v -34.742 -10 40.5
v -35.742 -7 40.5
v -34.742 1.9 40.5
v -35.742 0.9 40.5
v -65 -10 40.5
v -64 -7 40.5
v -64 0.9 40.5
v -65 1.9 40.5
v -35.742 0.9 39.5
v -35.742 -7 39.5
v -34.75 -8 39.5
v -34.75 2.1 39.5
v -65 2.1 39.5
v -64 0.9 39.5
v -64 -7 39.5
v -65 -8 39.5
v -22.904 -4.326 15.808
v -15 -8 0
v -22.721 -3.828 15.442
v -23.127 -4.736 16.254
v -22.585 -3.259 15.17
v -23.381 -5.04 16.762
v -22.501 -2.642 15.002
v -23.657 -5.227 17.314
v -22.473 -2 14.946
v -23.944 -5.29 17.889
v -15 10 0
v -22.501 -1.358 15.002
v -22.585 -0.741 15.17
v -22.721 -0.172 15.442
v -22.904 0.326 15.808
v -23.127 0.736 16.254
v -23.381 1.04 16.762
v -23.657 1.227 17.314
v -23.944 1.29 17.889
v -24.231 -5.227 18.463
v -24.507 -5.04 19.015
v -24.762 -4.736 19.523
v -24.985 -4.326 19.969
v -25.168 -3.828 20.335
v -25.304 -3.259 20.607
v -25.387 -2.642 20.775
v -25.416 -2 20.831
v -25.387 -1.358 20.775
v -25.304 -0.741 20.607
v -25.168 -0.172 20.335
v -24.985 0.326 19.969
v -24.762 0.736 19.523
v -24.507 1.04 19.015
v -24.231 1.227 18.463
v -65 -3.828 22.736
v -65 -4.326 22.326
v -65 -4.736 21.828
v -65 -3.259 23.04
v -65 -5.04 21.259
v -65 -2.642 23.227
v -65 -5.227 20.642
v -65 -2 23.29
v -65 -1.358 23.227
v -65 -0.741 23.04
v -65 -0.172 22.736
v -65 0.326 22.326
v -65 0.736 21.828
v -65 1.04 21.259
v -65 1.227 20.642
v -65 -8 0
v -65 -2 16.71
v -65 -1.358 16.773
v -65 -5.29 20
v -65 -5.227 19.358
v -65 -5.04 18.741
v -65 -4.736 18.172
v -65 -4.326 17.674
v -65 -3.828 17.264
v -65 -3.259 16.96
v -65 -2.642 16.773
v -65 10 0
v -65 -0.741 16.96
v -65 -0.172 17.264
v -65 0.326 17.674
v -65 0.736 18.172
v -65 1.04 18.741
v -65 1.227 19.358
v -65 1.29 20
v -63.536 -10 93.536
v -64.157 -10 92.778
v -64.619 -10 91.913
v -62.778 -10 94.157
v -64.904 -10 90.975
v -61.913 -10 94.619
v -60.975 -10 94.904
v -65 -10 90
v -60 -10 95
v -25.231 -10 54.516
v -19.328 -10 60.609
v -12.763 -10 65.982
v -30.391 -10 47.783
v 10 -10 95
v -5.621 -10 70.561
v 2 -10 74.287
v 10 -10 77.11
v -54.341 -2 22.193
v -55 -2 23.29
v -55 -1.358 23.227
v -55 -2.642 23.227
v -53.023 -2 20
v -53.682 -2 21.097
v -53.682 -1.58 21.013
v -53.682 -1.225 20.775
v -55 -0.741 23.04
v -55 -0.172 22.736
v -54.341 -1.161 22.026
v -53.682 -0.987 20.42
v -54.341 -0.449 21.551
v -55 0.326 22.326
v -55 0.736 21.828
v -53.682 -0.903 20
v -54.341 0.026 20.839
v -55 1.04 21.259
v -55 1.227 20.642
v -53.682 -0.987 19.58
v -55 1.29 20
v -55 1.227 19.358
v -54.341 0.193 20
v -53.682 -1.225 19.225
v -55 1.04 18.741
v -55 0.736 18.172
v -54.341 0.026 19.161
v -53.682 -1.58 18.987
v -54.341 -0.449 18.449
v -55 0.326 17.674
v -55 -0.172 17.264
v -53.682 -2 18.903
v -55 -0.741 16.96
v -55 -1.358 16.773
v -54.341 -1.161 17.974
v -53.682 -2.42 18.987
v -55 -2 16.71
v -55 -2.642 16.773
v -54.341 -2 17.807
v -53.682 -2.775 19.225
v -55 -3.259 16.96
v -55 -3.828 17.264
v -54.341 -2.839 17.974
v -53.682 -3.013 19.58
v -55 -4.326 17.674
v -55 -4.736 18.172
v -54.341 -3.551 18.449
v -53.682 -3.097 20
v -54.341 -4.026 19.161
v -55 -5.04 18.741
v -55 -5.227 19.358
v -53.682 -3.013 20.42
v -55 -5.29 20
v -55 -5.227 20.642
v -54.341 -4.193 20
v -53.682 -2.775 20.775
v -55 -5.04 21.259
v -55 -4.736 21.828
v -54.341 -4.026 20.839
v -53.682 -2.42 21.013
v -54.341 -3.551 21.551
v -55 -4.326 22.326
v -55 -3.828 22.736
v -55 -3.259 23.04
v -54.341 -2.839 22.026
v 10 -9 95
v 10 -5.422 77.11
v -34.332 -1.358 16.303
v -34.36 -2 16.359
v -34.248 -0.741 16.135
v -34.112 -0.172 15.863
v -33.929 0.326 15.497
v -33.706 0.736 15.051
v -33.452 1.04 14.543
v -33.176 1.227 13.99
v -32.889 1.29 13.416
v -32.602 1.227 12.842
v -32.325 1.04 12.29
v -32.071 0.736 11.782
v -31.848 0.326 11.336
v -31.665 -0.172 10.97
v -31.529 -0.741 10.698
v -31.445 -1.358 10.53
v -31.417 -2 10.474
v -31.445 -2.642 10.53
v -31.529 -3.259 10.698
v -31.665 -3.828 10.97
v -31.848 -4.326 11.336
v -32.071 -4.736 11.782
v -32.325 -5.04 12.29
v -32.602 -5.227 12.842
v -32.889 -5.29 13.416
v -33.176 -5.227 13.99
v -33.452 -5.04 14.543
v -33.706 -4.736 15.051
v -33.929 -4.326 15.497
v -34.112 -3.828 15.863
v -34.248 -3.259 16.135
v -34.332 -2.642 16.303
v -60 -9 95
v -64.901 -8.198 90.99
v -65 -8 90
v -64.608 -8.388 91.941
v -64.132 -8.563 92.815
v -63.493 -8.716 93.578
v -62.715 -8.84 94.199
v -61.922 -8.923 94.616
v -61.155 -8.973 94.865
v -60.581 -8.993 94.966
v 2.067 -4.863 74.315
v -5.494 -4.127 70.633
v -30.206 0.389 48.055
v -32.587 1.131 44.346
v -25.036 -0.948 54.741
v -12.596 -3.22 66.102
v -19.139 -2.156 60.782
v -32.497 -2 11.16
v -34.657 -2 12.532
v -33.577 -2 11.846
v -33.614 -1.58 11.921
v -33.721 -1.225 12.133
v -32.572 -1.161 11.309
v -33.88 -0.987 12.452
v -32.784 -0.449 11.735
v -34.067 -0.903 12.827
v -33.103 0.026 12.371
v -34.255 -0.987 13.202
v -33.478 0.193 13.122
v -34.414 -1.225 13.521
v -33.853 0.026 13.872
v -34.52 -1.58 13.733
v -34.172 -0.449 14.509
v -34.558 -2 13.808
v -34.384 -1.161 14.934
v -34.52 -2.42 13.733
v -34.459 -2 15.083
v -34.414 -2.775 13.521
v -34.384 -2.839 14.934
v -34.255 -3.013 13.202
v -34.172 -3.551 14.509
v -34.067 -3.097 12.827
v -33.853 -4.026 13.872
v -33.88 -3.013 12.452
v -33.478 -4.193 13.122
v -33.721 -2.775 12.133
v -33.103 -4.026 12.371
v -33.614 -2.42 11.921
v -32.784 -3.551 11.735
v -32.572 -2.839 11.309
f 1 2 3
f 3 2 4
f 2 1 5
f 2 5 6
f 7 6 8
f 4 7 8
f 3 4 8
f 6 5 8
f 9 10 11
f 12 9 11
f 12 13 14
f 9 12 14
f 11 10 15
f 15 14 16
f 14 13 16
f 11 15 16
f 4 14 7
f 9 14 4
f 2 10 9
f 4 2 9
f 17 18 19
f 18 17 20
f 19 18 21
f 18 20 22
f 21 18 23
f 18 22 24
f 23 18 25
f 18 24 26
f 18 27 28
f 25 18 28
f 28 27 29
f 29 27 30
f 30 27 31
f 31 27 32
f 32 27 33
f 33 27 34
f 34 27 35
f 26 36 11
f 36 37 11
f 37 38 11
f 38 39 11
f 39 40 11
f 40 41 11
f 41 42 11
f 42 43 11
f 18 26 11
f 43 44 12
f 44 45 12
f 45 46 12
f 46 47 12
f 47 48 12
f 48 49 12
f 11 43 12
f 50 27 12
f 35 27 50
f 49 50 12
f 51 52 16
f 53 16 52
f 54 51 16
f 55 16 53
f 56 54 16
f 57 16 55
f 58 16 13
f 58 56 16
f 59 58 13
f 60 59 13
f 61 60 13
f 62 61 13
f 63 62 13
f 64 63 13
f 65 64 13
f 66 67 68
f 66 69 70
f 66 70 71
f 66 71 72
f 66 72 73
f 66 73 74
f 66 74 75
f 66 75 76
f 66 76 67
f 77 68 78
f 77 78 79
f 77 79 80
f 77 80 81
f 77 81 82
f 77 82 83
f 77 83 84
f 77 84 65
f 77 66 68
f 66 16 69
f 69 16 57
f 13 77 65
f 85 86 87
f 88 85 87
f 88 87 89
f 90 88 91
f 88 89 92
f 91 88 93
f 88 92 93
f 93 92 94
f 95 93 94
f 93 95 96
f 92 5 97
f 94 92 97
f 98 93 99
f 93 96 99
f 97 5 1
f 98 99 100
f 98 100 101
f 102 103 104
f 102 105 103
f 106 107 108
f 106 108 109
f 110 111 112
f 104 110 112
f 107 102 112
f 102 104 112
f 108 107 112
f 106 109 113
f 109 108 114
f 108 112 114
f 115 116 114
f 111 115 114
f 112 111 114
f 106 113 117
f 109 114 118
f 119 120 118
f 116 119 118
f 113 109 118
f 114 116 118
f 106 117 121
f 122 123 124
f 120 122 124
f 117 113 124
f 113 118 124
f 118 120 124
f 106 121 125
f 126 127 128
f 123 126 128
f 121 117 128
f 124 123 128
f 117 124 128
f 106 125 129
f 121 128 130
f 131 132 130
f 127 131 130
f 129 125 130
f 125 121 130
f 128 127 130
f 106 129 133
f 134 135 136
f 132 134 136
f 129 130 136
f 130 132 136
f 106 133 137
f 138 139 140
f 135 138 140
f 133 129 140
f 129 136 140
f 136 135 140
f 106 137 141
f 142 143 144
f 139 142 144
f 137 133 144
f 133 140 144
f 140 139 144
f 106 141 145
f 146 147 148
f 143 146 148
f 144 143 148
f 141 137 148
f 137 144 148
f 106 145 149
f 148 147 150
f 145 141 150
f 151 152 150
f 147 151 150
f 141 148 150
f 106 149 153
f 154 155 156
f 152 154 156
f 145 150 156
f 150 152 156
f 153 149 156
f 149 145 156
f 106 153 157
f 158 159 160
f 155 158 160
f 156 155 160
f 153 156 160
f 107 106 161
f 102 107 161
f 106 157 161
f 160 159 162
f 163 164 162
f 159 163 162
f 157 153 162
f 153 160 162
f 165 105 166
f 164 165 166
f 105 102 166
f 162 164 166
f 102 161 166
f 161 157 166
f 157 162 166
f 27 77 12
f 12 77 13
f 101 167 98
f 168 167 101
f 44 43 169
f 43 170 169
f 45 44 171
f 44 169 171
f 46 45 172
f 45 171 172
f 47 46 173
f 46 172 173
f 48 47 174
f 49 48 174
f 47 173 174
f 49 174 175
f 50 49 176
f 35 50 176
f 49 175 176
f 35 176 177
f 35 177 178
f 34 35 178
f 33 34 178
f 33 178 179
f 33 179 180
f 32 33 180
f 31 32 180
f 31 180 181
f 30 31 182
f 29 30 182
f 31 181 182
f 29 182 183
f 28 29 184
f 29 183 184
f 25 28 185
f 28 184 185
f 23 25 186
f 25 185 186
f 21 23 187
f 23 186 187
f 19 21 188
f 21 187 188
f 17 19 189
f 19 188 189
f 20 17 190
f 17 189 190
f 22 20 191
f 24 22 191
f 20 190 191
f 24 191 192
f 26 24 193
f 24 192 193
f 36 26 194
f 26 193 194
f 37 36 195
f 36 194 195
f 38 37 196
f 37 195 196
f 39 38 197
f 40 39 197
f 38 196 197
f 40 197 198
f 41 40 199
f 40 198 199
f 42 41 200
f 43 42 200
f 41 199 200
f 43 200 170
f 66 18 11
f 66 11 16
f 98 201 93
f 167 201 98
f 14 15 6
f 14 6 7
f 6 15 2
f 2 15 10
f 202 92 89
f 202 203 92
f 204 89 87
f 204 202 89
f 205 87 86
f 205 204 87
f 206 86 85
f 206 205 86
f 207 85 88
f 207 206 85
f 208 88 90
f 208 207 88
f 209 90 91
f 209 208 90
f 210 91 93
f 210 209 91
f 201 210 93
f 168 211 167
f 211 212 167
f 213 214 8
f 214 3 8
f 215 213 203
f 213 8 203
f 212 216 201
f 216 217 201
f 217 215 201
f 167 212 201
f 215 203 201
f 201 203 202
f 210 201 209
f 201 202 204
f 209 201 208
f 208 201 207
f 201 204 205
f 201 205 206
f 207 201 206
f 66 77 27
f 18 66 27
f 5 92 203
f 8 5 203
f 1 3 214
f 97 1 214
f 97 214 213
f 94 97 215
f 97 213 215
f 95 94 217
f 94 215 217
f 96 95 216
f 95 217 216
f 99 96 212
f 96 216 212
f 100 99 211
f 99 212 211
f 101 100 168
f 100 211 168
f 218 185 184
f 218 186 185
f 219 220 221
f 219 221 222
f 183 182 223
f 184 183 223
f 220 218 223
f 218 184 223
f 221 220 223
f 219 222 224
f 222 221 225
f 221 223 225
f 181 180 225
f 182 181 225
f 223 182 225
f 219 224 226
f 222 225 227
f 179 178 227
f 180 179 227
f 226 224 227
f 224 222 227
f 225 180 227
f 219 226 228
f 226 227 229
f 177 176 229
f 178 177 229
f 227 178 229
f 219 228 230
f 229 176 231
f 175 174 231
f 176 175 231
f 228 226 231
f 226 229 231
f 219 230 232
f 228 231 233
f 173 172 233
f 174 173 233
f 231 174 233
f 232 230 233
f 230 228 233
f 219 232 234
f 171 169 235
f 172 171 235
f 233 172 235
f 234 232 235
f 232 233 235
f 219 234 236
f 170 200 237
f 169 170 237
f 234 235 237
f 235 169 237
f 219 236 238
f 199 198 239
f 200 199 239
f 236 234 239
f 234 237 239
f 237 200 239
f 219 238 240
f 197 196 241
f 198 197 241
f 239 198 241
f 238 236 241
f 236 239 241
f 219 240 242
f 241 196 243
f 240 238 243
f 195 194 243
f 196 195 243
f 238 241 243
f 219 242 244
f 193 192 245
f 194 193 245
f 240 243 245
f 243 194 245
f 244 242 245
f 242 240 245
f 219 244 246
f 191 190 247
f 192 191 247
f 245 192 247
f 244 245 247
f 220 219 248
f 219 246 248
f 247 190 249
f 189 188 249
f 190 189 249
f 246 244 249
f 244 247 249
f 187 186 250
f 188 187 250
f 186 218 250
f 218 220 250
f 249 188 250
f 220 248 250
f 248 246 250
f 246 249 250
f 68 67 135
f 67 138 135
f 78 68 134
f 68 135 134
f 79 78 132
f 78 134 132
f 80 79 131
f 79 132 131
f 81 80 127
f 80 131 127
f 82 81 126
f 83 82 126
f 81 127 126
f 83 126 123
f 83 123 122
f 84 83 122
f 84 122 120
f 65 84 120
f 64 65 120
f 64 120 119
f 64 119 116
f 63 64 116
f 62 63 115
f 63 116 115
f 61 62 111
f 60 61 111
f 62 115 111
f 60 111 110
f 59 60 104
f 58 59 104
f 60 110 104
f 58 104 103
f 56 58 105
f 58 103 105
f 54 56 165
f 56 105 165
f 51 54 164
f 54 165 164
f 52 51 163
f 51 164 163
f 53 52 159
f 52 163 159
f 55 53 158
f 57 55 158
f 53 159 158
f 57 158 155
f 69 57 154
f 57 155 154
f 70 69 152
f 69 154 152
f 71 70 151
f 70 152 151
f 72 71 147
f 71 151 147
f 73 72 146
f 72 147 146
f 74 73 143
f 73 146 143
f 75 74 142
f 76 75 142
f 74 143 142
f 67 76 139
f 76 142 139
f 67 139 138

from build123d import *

# Parameters (mm, degrees)
ESBO_O1_W                                      = 130
ESBO_O1_H                                      = 20
RESSALTO_EXTRUS_O1_DEPTH                       = 95
CORTE_EXTRUS_O2_REACH                          = 22
CORTE_EXTRUS_O4_DEPTH                          = 1
CORTE_EXTRUS_O4_DEPTH_BACK                     = 131
BROCA_DE_ROSQUEAR_DE_CANO_PARA_TARRAXA_D_D     = 6.579997
BROCA_DE_ROSQUEAR_DE_CANO_PARA_TARRAXA_D_DEPTH = 10
BROCA_DE_ROSQUEAR_DE_CANO_PARA_TARRAXA_D_TIP   = 1.976830535
BROCA_DE_ROSQUEAR_DE_CANO_PARA_TARRA_2_D       = 6.579997
BROCA_DE_ROSQUEAR_DE_CANO_PARA_TARRA_2_DEPTH   = 10
BROCA_DE_ROSQUEAR_DE_CANO_PARA_TARRA_2_TIP     = 1.976830535
FILETE2_R                                      = 5
CORTE_EXTRUS_O7_DEPTH                          = 131
RESSALTO_EXTRUS_O2_REACH                       = 57.5
ESBO_O37_W                                     = 28.258303284
ESBO_O37_H                                     = 7.9
CORTE_EXTRUS_O8_REACH                          = 21.612
ESBO_O38_W                                     = 55
ESBO_O38_H                                     = 21.847631836
ESBO_O39_W                                     = 50
ESBO_O39_H                                     = 2
CORTE_EXTRUS_O9_DEPTH                          = 40.5


with BuildPart() as part:
    # Esboço1 → Ressalto-extrusão1 (new body)
    with BuildSketch(Plane.XY):
        Rectangle(ESBO_O1_W, ESBO_O1_H)
    extrude(amount=RESSALTO_EXTRUS_O1_DEPTH)

    # Esboço2 → Corte-extrusão2 (cut, up to next)
    with BuildSketch(Plane(origin=(0, 10, 0), x_dir=(1, 0, 0), z_dir=(0, 1, 0)), mode=Mode.PRIVATE) as corte_extrus_o2_sk1:
        with BuildLine():
            Line((65, 0), (-15, 0))
            Line((-15, 0), (-35, -40))
            ThreePointArc((-35, -40), (-7.92883262, -69.207295879), (30.404335441, -80))
            Line((30.404335441, -80), (65, -80))
            Line((65, -80), (65, 0))
        make_face()
    corte_extrus_o2_tool1 = extrude(corte_extrus_o2_sk1.sketch, amount=-CORTE_EXTRUS_O2_REACH, mode=Mode.PRIVATE) & part.part
    add(corte_extrus_o2_tool1.solids().sort_by_distance((21.312978, 10, 38.404428))[0], mode=Mode.SUBTRACT)

    # Esboço13 → Corte-extrusão4 (cut, two sides)
    with BuildSketch(Plane.ZY.offset(65)) as corte_extrus_o4_sk:
        Polygon((-200.200134404, 50.040026881), (0, 10), (95, -9), (295.200134404, -49.040026881), (375.280188165, 351.360241926), (-120.120080642, 450.440295688), align=None)
    extrude(amount=CORTE_EXTRUS_O4_DEPTH, mode=Mode.SUBTRACT)
    extrude(corte_extrus_o4_sk.sketch, amount=-CORTE_EXTRUS_O4_DEPTH_BACK, mode=Mode.SUBTRACT)

    # Broca de rosquear de cano para tarraxa d
    with Locations(Plane.ZY.offset(65)):
        with Locations((20, -2)):
            Hole(BROCA_DE_ROSQUEAR_DE_CANO_PARA_TARRAXA_D_D / 2, depth=BROCA_DE_ROSQUEAR_DE_CANO_PARA_TARRAXA_D_DEPTH)
            with Locations((0, 0, -(BROCA_DE_ROSQUEAR_DE_CANO_PARA_TARRAXA_D_DEPTH + BROCA_DE_ROSQUEAR_DE_CANO_PARA_TARRAXA_D_TIP / 2))):  # 118° drill point
                Cone(0, BROCA_DE_ROSQUEAR_DE_CANO_PARA_TARRAXA_D_D / 2, BROCA_DE_ROSQUEAR_DE_CANO_PARA_TARRAXA_D_TIP, mode=Mode.SUBTRACT)

    # Broca de rosquear de cano para tarra 2
    with Locations(Plane(origin=(-12, 0, -6), x_dir=(0.447213595, 0, -0.894427191), z_dir=(0.894427191, 0, 0.447213595))):
        with Locations((-26.708203932, -2)):
            Hole(BROCA_DE_ROSQUEAR_DE_CANO_PARA_TARRA_2_D / 2, depth=BROCA_DE_ROSQUEAR_DE_CANO_PARA_TARRA_2_DEPTH)
            with Locations((0, 0, -(BROCA_DE_ROSQUEAR_DE_CANO_PARA_TARRA_2_DEPTH + BROCA_DE_ROSQUEAR_DE_CANO_PARA_TARRA_2_TIP / 2))):  # 118° drill point
                Cone(0, BROCA_DE_ROSQUEAR_DE_CANO_PARA_TARRA_2_D / 2, BROCA_DE_ROSQUEAR_DE_CANO_PARA_TARRA_2_TIP, mode=Mode.SUBTRACT)

    # Filete2
    filete2_edges = [part.edges().sort_by_distance(p)[0] for p in [
        (-65, -9.5, 95),
    ]]
    fillet(filete2_edges, radius=FILETE2_R)

    # Esboço34 → Corte-extrusão7 (cut, through all)
    with BuildSketch(Plane.ZY.offset(65)):
        Polygon((40, -10), (40, 2), (39.5, 2.1), (39.5, -10), align=None)
        Polygon((40.5, 1.9), (40, 2), (40, -10), (40.5, -10), align=None)
    extrude(amount=-CORTE_EXTRUS_O7_DEPTH, mode=Mode.SUBTRACT)

    # Esboço37 → Ressalto-extrusão2 (add, up to next)
    with BuildSketch(Plane.XY.offset(39.5), mode=Mode.PRIVATE) as ressalto_extrus_o2_sk1:
        with Locations((-49.870848358, -3.05)):
            Rectangle(ESBO_O37_W, ESBO_O37_H)
    ressalto_extrus_o2_tool1 = extrude(ressalto_extrus_o2_sk1.sketch, amount=RESSALTO_EXTRUS_O2_REACH, mode=Mode.PRIVATE) - part.part
    add(ressalto_extrus_o2_tool1.solids().sort_by_distance((-49.870848, -3.05, 39.5))[0])

    # Esboço38 → Corte-extrusão8 (cut, up to next)
    with BuildSketch(Plane(origin=(0, 9.615384615, 1.923076923), x_dir=(1, 0, 0), z_dir=(0, 0.980580676, 0.196116135)), mode=Mode.PRIVATE) as corte_extrus_o8_sk1:
        with Locations((37.5, -84.932685446)):
            Rectangle(ESBO_O38_W, ESBO_O38_H)
    corte_extrus_o8_tool1 = extrude(corte_extrus_o8_sk1.sketch, amount=-CORTE_EXTRUS_O8_REACH, mode=Mode.PRIVATE) & part.part
    add(corte_extrus_o8_tool1.solids().sort_by_distance((37.5, -7.041285, 85.206427))[0], mode=Mode.SUBTRACT)

    # Esboço39 → Corte-extrusão9 (cut)
    with BuildSketch(Plane(origin=(0, 0, 0), x_dir=(-1, 0, 0), z_dir=(0, 0, -1))):
        with Locations((40, -9)):
            Rectangle(ESBO_O39_W, ESBO_O39_H)
    extrude(amount=-CORTE_EXTRUS_O9_DEPTH, mode=Mode.SUBTRACT)


solid = part.part
